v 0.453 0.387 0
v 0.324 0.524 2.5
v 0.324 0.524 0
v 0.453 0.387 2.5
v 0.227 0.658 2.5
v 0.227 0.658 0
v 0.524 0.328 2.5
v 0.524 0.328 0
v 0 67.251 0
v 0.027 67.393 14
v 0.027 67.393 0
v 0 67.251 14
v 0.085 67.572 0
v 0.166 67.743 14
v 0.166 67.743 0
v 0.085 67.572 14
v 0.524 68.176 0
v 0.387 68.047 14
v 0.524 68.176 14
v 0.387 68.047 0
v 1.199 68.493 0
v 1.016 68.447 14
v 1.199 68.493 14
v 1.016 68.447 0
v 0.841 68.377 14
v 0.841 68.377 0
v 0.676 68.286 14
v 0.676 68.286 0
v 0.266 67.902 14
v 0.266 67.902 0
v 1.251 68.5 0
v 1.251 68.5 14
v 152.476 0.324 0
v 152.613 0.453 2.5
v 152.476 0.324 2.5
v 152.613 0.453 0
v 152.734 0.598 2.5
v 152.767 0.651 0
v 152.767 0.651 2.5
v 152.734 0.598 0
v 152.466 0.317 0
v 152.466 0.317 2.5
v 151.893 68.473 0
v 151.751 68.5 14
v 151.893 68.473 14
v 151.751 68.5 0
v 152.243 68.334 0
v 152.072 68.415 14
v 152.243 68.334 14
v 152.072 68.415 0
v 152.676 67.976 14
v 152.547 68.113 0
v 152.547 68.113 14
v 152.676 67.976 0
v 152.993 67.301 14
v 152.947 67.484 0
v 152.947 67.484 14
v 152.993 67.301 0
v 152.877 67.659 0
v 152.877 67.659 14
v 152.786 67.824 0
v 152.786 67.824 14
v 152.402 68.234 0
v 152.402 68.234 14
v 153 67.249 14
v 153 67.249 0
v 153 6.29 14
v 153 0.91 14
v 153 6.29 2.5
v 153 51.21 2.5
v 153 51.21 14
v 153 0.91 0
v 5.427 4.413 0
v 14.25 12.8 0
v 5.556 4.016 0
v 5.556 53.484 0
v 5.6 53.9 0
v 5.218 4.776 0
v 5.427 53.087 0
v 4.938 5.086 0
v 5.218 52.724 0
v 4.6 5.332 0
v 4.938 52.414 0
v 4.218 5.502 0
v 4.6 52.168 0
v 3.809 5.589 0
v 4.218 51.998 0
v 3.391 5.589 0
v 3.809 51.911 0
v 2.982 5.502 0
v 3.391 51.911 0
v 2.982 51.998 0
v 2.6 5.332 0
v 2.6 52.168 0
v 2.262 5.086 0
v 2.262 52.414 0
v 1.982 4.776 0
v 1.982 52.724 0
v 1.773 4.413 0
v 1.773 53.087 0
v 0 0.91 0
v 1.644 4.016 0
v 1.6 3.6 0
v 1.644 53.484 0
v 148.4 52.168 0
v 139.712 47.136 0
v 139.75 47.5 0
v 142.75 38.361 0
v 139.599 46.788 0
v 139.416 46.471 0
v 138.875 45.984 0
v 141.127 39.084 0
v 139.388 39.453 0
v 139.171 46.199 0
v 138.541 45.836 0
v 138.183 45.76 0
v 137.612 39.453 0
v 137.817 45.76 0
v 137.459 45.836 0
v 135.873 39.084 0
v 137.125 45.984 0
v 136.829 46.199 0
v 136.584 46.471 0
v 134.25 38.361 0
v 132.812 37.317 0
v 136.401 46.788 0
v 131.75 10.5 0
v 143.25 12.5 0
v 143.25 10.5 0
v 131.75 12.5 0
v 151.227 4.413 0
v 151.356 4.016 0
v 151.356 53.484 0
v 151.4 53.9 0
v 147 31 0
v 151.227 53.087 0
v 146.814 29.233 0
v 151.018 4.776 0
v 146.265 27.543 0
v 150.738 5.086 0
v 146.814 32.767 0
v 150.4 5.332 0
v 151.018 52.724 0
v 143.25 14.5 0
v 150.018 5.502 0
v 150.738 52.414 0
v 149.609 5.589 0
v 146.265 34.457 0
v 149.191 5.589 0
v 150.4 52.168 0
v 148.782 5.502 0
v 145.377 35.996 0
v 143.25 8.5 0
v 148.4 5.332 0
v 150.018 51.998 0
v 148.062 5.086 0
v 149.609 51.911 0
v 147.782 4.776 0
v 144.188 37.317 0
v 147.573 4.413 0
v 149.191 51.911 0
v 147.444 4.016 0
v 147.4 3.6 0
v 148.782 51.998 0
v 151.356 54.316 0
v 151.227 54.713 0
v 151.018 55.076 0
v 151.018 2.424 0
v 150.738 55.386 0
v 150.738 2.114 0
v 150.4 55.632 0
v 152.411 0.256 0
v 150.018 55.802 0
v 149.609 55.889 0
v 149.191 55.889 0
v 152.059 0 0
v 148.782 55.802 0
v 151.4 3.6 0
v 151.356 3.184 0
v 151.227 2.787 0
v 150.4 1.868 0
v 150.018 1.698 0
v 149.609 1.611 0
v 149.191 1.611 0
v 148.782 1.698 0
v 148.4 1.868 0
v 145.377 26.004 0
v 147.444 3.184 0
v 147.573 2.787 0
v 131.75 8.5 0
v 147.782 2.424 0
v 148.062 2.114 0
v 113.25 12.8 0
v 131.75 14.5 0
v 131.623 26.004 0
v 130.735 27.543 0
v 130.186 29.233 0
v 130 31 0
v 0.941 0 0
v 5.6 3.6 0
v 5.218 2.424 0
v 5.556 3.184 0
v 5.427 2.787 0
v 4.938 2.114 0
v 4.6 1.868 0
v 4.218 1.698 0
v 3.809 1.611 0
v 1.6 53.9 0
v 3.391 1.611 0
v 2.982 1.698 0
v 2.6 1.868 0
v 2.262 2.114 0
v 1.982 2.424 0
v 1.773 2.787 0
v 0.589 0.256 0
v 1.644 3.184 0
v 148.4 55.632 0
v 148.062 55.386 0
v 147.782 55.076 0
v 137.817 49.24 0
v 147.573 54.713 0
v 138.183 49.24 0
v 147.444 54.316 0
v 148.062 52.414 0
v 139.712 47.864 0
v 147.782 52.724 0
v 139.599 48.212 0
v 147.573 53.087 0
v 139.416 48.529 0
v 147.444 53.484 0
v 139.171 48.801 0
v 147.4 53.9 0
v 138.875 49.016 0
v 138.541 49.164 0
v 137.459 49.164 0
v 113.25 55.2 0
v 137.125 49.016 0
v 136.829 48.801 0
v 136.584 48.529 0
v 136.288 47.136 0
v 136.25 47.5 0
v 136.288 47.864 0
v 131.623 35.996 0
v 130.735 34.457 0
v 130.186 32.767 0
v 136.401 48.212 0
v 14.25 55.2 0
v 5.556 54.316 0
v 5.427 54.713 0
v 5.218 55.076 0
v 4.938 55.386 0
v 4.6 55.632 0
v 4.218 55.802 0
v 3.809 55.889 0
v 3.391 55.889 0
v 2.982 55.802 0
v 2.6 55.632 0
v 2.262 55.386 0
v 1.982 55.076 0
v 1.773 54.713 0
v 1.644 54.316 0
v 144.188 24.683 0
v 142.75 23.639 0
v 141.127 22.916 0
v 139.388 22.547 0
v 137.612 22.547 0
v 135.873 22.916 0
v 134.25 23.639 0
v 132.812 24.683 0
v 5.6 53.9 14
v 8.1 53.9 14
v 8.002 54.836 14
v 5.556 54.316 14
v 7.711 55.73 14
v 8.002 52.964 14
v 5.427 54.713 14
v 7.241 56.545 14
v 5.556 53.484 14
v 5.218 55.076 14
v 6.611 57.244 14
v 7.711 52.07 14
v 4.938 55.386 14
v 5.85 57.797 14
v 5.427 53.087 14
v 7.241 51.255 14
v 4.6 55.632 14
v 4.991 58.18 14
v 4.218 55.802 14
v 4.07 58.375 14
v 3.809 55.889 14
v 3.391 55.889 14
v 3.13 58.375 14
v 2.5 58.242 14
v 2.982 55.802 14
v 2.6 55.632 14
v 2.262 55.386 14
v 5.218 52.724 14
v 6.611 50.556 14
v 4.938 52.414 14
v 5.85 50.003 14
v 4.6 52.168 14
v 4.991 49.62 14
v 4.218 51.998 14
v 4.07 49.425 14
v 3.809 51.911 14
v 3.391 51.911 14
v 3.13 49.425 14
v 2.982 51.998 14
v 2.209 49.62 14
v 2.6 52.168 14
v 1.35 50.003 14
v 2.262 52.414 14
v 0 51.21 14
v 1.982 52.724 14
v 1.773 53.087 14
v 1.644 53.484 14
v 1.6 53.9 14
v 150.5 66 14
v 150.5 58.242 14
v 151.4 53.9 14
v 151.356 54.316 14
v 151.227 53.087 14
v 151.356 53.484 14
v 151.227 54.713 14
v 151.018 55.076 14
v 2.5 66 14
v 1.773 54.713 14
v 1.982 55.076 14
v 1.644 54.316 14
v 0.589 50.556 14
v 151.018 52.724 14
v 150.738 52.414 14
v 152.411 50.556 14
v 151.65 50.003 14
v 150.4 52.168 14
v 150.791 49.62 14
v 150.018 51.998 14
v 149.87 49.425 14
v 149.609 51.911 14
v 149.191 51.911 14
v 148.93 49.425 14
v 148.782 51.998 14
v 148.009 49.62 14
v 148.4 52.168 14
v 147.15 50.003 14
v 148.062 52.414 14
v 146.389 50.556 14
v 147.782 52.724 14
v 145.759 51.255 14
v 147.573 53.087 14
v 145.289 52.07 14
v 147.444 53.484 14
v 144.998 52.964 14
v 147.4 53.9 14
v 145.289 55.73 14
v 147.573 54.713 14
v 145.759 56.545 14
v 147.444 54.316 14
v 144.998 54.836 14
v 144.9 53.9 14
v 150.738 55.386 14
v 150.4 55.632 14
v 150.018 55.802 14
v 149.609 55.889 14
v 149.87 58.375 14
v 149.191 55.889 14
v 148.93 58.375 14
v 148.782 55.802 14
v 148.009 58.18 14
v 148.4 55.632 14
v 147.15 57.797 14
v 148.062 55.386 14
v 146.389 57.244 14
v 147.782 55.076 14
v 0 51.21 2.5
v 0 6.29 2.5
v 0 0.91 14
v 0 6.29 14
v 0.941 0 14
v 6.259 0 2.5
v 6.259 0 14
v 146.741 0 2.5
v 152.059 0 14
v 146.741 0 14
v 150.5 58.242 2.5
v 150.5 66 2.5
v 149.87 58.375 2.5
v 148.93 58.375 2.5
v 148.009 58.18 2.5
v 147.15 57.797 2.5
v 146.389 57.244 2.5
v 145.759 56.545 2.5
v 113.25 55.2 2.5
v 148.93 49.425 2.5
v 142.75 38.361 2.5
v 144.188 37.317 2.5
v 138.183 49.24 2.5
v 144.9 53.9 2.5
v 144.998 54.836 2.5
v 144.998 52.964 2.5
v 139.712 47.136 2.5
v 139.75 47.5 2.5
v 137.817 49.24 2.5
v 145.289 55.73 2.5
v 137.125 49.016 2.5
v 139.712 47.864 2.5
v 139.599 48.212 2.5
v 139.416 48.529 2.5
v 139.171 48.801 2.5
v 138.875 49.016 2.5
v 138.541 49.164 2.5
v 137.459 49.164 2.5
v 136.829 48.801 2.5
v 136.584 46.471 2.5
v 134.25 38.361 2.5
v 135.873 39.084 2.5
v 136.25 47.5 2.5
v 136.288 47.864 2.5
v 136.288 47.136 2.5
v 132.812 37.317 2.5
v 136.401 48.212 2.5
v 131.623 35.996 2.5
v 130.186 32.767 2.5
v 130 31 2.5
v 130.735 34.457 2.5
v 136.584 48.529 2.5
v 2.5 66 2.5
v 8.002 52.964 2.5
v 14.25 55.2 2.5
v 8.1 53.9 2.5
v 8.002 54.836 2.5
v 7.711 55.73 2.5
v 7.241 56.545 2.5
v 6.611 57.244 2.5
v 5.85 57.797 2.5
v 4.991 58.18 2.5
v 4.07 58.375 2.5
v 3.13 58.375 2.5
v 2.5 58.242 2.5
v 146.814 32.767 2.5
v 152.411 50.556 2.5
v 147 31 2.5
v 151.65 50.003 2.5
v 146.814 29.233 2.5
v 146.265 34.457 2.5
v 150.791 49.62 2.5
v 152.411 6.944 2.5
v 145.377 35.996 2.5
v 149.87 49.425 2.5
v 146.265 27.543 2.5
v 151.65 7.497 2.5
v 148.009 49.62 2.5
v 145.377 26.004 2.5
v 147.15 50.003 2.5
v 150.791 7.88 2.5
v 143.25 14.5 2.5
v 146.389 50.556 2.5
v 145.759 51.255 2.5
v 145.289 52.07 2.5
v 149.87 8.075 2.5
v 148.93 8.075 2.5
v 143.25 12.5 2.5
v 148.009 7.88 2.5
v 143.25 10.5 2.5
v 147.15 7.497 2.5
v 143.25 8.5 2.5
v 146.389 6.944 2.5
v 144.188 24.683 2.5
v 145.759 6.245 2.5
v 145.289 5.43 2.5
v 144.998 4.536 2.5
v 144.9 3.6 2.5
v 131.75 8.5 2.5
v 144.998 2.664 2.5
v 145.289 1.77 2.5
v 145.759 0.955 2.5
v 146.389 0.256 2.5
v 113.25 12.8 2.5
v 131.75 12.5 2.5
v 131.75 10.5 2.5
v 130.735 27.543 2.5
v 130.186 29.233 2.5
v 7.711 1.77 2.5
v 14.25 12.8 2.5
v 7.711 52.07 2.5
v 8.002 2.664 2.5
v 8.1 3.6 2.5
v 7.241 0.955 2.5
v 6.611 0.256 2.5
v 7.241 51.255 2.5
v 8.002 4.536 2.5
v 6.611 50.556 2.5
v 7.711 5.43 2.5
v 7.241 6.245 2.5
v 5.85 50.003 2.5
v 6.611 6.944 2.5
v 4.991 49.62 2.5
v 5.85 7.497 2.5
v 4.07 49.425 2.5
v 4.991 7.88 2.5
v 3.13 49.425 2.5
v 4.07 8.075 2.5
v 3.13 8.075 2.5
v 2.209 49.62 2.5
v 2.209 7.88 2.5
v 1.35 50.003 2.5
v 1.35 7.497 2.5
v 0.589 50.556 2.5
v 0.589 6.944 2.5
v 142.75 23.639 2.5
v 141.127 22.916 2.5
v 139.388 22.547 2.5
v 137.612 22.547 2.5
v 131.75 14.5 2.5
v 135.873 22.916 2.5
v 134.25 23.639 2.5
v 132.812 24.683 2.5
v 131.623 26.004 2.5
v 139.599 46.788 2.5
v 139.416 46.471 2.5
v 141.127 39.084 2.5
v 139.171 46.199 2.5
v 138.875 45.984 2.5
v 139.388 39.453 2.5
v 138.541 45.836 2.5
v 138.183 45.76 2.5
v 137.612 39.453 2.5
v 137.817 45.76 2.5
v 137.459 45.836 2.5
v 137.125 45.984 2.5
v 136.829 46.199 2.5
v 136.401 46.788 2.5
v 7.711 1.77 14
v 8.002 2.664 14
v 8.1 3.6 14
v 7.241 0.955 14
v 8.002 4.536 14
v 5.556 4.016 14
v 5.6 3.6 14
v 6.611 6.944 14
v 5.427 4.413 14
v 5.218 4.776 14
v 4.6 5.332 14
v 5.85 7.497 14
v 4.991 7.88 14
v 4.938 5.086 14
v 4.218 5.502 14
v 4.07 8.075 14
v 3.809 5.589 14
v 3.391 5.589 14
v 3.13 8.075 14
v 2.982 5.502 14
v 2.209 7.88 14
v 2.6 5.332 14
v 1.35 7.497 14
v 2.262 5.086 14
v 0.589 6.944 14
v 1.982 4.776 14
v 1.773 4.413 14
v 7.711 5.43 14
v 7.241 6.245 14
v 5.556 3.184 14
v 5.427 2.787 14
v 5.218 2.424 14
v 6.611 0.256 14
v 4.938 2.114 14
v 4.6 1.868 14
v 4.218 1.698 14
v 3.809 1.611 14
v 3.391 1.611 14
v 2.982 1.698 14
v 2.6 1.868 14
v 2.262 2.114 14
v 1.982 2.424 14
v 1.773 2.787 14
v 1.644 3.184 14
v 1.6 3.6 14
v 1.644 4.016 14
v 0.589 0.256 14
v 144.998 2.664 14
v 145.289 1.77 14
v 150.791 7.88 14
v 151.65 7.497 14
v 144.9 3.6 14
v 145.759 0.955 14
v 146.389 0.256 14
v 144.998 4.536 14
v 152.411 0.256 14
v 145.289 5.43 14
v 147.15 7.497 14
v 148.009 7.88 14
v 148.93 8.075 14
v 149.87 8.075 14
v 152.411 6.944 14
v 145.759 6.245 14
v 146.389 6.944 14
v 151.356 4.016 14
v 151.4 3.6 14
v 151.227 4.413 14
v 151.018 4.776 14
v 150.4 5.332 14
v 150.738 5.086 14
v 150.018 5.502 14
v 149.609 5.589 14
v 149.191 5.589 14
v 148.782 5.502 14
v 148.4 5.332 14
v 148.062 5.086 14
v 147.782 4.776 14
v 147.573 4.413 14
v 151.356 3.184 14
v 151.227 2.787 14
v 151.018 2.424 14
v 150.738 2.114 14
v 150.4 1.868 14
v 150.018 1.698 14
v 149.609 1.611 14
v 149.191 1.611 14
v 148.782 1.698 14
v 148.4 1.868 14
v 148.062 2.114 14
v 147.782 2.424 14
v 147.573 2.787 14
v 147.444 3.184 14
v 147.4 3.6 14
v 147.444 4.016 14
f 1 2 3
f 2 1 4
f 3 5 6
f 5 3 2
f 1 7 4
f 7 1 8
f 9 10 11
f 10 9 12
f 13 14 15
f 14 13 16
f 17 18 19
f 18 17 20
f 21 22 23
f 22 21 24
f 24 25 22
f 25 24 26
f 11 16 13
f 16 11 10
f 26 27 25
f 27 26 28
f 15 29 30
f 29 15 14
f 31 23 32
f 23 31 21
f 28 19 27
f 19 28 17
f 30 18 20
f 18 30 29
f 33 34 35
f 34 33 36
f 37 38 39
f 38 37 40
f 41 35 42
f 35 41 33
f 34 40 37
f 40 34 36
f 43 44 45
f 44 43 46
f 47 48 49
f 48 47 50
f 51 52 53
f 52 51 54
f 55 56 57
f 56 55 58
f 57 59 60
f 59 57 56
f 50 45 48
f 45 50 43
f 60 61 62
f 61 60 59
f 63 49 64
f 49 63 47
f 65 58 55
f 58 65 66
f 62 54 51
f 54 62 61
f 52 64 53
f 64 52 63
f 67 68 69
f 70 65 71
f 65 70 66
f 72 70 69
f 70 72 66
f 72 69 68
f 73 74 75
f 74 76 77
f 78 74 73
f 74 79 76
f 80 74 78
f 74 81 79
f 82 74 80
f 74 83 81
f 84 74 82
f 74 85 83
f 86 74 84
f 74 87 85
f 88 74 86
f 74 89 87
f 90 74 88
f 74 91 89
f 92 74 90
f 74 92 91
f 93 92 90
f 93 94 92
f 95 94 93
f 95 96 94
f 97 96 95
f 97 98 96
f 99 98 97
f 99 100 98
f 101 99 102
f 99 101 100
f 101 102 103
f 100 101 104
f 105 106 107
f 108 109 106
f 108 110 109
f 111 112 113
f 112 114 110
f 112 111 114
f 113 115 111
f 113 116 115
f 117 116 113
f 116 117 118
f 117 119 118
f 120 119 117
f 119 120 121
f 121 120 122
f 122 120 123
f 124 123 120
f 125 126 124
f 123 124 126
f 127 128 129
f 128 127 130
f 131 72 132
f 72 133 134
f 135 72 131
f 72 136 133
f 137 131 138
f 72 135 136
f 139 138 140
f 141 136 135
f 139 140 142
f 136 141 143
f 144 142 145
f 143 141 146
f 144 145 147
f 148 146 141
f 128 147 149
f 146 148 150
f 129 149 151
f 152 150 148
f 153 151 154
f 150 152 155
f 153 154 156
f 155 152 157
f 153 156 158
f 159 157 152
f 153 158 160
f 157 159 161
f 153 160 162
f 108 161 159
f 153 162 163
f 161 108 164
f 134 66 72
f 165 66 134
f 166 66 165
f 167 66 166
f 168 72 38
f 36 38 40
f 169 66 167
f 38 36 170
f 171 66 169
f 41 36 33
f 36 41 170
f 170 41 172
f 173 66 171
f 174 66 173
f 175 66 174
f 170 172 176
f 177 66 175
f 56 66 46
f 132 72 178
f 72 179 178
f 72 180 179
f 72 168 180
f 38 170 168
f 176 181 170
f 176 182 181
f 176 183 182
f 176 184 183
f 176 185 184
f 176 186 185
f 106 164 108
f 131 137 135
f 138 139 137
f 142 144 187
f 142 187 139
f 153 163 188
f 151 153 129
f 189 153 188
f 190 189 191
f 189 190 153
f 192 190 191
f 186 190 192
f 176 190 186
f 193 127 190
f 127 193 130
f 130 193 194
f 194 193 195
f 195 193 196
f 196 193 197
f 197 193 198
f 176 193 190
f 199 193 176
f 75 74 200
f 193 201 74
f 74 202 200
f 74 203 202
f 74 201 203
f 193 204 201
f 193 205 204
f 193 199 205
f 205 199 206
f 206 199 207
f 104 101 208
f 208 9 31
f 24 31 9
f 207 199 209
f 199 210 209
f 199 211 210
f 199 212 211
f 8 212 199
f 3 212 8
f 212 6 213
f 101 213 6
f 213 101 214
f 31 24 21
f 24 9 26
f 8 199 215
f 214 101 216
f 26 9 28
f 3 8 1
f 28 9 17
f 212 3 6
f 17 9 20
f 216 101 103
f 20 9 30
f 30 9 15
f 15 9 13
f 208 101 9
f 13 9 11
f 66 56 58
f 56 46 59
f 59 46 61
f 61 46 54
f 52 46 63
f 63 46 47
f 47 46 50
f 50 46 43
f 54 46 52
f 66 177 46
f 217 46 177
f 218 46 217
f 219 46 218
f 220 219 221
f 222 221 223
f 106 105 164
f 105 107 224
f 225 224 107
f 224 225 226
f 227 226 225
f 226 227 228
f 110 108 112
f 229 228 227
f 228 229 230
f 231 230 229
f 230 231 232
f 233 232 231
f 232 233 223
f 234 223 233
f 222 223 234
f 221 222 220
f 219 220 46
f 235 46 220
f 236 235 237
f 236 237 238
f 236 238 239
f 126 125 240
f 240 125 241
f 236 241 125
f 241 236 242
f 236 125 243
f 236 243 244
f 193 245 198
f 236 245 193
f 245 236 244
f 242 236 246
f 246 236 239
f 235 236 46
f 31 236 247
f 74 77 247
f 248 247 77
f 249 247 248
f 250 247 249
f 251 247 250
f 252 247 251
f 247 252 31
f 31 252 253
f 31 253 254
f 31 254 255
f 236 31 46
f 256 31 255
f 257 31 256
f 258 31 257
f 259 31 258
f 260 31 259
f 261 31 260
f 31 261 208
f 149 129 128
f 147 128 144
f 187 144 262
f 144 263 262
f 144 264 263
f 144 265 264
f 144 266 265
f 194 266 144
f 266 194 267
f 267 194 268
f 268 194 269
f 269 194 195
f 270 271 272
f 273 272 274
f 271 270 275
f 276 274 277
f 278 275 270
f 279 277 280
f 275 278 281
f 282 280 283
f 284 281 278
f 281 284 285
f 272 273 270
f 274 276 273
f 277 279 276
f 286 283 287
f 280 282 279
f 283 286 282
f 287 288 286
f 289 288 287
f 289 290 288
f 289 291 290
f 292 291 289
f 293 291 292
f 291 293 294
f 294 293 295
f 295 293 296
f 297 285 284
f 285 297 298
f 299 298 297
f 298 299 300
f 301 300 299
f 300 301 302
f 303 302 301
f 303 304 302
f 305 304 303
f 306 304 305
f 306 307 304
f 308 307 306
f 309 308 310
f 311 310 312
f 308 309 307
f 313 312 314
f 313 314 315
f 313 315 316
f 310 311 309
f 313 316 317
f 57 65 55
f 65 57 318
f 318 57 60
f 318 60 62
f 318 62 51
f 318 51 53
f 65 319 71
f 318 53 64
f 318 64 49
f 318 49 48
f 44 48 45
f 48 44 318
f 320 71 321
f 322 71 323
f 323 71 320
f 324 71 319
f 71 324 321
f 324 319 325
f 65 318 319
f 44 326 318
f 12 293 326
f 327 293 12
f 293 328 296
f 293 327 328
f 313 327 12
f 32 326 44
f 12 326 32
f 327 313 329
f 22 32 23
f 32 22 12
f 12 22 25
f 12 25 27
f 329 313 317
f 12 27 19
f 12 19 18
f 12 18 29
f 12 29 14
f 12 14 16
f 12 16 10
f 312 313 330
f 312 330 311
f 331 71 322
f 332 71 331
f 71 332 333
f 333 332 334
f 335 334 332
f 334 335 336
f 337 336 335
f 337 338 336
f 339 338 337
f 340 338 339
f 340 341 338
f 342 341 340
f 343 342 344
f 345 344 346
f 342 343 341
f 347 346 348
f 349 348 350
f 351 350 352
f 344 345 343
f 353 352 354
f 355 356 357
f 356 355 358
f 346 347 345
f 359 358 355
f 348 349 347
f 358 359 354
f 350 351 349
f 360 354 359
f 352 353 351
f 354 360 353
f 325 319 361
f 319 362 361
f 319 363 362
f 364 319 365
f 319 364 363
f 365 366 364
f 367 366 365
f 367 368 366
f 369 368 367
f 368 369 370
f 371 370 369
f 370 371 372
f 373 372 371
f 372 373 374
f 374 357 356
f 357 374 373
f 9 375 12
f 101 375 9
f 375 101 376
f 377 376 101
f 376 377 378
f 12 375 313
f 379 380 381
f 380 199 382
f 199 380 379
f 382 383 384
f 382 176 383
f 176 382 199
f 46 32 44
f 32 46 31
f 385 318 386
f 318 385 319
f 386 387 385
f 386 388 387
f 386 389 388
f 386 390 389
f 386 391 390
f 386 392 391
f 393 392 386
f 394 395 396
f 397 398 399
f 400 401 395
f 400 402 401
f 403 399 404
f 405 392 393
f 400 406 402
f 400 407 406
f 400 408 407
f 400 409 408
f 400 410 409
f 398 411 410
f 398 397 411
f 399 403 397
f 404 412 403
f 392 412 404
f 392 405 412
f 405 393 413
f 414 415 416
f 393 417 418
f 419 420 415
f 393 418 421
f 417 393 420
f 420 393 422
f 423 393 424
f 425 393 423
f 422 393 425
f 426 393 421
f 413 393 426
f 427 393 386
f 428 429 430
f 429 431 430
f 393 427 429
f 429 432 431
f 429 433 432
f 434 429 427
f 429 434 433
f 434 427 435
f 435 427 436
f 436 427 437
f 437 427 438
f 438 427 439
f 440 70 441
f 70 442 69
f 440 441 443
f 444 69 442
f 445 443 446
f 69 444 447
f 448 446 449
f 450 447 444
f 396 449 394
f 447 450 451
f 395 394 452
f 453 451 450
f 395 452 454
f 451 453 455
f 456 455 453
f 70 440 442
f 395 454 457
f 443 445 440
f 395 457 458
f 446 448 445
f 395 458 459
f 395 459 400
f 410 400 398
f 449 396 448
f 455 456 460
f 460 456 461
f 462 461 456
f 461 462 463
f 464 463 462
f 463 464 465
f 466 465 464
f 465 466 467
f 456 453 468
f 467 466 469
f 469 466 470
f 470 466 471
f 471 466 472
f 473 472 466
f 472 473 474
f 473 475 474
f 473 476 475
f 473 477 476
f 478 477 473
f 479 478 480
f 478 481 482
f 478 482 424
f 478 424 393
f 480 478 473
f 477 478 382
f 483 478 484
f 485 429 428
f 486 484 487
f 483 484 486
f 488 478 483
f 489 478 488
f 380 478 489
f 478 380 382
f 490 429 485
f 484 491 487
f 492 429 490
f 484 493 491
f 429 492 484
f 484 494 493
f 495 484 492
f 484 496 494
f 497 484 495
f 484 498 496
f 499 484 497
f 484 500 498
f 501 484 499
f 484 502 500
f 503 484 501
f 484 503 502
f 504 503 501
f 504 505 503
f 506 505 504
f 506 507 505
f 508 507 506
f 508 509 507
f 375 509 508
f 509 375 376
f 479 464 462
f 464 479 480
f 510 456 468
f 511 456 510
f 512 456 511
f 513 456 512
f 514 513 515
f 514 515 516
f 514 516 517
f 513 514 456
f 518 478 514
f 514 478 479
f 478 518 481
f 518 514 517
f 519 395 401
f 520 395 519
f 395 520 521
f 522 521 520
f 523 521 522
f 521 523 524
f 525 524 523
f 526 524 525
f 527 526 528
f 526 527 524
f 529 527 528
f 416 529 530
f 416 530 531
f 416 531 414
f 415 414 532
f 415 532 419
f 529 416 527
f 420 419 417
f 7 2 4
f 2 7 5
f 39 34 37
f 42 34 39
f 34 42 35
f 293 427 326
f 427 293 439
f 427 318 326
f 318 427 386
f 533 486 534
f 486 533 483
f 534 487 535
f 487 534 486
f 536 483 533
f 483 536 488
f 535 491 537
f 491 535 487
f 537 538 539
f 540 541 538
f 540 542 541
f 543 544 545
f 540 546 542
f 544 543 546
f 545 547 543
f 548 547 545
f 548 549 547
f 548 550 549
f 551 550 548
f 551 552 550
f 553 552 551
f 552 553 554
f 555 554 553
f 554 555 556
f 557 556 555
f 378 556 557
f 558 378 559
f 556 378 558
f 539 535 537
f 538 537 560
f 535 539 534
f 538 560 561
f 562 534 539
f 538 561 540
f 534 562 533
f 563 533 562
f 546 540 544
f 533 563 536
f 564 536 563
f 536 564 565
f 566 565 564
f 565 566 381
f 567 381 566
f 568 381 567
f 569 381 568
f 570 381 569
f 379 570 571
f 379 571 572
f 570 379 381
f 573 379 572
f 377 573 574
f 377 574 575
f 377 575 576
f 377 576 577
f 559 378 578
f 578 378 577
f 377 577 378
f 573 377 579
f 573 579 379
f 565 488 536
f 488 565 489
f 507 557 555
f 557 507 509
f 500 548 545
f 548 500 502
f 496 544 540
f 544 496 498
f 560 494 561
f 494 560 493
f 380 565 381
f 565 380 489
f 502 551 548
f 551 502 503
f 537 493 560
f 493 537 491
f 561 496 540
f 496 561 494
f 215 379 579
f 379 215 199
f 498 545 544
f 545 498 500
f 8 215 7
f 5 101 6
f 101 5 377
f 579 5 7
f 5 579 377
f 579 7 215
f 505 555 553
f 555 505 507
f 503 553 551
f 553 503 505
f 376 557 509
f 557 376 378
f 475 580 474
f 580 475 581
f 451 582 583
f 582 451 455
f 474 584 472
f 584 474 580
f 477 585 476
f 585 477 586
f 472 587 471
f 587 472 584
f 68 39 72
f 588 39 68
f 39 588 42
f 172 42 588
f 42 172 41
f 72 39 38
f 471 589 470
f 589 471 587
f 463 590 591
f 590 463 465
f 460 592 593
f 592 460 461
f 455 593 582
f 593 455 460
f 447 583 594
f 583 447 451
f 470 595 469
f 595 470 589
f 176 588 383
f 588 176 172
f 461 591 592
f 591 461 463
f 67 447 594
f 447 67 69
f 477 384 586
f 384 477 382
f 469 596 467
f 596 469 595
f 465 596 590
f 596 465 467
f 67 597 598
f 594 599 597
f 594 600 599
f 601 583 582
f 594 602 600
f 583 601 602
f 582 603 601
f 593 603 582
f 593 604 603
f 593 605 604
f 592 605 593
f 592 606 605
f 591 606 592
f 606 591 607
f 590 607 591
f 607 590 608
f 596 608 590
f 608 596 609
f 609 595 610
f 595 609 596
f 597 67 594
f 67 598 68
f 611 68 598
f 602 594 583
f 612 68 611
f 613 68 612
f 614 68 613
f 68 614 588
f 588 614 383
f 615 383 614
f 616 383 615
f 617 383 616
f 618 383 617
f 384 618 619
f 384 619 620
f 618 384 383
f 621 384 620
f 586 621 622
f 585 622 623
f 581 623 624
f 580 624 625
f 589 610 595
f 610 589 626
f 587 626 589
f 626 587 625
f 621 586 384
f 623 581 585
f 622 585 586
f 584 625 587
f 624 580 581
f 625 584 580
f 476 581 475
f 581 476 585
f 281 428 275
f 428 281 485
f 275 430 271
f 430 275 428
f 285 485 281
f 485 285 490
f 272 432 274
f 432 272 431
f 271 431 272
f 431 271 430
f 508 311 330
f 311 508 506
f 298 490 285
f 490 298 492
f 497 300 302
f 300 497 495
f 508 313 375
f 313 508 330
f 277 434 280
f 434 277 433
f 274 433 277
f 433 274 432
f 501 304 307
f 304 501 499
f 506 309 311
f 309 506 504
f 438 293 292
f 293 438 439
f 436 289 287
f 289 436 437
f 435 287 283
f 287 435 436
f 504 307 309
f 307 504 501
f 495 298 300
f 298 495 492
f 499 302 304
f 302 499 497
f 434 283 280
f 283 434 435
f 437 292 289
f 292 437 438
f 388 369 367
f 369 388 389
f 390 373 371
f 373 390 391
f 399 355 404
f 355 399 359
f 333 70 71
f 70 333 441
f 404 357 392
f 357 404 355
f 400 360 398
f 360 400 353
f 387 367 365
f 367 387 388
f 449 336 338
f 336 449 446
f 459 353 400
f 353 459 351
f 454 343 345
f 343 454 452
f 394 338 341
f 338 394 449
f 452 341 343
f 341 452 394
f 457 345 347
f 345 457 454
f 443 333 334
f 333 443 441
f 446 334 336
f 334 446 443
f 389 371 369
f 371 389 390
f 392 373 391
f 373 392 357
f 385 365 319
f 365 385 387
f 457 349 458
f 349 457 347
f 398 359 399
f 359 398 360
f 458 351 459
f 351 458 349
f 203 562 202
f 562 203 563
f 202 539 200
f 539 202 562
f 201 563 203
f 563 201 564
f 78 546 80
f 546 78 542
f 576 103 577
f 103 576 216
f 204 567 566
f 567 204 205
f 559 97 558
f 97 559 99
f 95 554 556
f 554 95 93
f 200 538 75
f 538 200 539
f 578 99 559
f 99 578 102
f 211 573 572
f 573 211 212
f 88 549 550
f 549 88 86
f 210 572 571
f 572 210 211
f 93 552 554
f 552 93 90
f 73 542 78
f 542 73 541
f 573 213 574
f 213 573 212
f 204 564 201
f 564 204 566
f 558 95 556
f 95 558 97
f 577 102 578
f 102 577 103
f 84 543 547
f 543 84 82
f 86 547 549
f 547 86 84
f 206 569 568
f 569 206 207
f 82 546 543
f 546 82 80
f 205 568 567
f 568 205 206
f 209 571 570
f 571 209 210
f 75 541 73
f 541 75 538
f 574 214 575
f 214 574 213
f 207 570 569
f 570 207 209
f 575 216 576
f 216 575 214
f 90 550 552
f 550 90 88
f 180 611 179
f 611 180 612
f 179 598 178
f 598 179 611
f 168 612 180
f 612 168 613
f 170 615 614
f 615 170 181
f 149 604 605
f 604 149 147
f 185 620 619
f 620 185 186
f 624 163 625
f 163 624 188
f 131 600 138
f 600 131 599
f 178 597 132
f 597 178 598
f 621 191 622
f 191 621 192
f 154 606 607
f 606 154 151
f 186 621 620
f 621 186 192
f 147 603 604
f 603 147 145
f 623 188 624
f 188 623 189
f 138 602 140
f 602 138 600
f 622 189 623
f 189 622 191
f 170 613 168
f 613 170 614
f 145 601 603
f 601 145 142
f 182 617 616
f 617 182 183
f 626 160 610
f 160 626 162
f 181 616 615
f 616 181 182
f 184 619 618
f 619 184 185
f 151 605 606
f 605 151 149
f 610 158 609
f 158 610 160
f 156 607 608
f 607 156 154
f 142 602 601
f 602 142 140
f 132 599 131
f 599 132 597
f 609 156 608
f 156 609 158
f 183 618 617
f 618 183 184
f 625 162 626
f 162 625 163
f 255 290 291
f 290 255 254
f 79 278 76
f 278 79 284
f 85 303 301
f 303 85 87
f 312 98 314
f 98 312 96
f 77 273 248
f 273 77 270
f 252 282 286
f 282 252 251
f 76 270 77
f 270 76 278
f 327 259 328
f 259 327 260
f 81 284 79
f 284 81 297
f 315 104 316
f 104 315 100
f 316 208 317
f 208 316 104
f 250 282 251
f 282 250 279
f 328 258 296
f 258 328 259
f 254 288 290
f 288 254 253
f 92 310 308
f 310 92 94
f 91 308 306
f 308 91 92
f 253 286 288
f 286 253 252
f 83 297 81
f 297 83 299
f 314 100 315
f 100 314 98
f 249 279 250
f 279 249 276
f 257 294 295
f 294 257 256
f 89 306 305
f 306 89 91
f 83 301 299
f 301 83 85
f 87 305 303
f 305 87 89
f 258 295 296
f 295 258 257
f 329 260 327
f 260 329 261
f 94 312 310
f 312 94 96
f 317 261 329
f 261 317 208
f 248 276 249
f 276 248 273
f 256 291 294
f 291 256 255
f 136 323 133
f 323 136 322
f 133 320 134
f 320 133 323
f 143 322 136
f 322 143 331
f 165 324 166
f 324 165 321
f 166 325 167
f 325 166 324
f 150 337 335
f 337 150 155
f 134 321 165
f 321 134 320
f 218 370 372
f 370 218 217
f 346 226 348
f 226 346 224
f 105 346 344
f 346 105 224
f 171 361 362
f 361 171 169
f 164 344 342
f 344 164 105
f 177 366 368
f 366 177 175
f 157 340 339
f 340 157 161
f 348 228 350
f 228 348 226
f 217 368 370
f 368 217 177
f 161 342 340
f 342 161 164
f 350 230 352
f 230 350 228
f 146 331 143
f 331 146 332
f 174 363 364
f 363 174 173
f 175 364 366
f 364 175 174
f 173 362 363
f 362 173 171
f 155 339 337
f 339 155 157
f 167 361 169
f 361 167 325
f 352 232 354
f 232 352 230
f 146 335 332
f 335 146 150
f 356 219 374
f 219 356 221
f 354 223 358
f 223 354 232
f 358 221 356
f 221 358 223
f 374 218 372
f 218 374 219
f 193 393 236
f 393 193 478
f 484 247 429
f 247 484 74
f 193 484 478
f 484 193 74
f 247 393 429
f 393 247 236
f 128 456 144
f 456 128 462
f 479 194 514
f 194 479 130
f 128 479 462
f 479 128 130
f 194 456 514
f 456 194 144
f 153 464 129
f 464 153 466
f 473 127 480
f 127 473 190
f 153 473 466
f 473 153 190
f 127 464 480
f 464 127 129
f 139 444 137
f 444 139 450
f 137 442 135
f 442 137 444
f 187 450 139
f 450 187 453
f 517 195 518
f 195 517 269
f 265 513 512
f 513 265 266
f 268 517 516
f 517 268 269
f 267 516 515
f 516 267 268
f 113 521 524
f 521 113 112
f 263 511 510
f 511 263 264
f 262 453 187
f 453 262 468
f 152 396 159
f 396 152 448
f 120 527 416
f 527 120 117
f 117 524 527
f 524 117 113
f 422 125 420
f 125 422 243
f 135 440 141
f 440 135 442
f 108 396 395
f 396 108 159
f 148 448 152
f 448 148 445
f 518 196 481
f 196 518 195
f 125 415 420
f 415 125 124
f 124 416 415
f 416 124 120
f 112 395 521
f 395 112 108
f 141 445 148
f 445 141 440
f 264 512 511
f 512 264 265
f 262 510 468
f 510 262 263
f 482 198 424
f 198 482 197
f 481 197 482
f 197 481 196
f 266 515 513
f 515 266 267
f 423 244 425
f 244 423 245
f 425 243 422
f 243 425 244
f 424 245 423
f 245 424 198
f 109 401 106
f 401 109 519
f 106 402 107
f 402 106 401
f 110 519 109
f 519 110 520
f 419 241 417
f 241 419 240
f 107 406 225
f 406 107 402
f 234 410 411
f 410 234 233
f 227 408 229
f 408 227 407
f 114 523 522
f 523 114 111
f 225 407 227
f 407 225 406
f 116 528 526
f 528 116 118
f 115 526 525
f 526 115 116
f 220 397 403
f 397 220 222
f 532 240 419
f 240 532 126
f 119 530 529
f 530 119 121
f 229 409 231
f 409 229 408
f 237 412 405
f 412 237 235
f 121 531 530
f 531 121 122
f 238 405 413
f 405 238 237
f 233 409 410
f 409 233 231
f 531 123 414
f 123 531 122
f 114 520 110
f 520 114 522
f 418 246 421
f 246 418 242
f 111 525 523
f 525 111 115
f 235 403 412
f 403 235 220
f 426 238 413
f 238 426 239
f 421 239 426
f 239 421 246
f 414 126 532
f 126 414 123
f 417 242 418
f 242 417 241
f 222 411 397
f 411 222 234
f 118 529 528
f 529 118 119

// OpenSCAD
// file: library/library_3d.scad
// ========================================================================================
// Robori Mendel
// General 3D library
// GNU GPL v3
//
// Contact : support@robori.com
// Reference : http://www.robori.com/documentation/Mendel
//
// History :
// 2013 - First version
// ========================================================================================

lib3d_fn = 50;

// TESTING
//lib3d_hex_nut_recess(3);
//lib3d_round_cube(10, 8, 10, 1, true, false, true, false);


// Hexagonal nut recess
module lib3d_hex_nut_recess(size)
{
	length = 0.8*size;
	hex_r = 1.8*size/2;
	cylinder(h=length, r=hex_r, center=false, $fn=6);
}

// Cube with customized rounded corners
module lib3d_round_cube(x, y, z, rad, left_top=true, left_bottom=true, right_top=true, right_bottom=true)
{
	rx = x/2 - rad + 0.02;
	ry = y/2 - rad + 0.02;

	translate([x/2, y/2, 0]) difference()
	{	
		translate([-x/2, -y/2, 0]) cube([x, y, z]);
		if (left_top)
			translate([-rx, ry, -1]) rotate([0, 0, 90]) __lib3d_round_corner(rad, z + 2);
		if (left_bottom)
			translate([-rx, -ry, -1]) rotate([0, 0, 180]) __lib3d_round_corner(rad, z + 2);
		if (right_top)
			translate([rx, ry, -1]) __lib3d_round_corner(rad, z + 2);
		if (right_bottom)
			translate([rx, -ry, -1]) rotate([0, 0, 270]) __lib3d_round_corner(rad, z + 2);
	}
}

// Helper
module __lib3d_round_corner(rad, height)
{
	difference()
	{
		cube([rad, rad, height]);
		cylinder(h=height, r=rad, center=false, $fn=lib3d_fn);
	}
}
// main file
// ========================================================================================
// Robori Mendel
// LCD cover for RepRapDiscount 2004 smart controller
// GNU GPL v3
//
// Contact : support@robori.com
// Reference : http://www.robori.com/documentation/Mendel
//
// History :
// 22 May 2015 - First version
// ========================================================================================

include <library/library_3d.scad>

$fn = 30;

cover_l = 151 + 2;
cover_w = 64 + 2 + 2.5;	
cover_h = 14;
cover_r = 1.5;
cover_wall_t = 2.5;
cover_front_t = 2.5;
cover_pillar_t = 2.5;
cover_screw_d = 3 + 1;

cover_screen_l = 97 + 2*1;
cover_screen_w = 40 + 2*1.2;

cover_buzz_l = 11.5;
cover_buzz_w = 2;

cover_encoder_d = 15 + 2;
cover_reset_d = 3.5;


lcd_cover();

module lcd_cover()
{
	// screw
	screw_dist = 2.6 + 1;
	lcd_pcb_excess = 8.5 + 1 + 2.5;
	screw1 = [screw_dist, cover_w - screw_dist, 0];
	screw2 = [cover_l - screw_dist, cover_w - screw_dist, 0];
	screw3 = [screw_dist, lcd_pcb_excess + screw_dist - 1, 0];
	screw4 = [cover_l - screw_dist, lcd_pcb_excess + screw_dist - 1, 0];

	// screen
	screen_center_x = 14.25 + 1 + 97/2;
	screen_center_y = 11 + 1 + 2.5 + 40/2;

	// buzz
	buzz_center_x = 136.5 + 1;
	buzz_center_y = 45 + lcd_pcb_excess;
	buzz_space_y = 2;

	// encoder
	encoder_x = 137.5 + 1;
	encoder_y = 25.5 + lcd_pcb_excess;

	// reset
	reset_x = 137 + 1;
	reset_y = 9 + lcd_pcb_excess;

	translate([0, cover_w, cover_h]) rotate([180, 0, 0]) difference()
	{
		union()
		{
			difference()
			{
				// block
				lib3d_round_cube(cover_l, cover_w, cover_h, cover_r, left_top=true, left_bottom=true, right_top=true, right_bottom=true);
				// wall : 4 sides
				//translate([cover_wall_t, cover_wall_t, -cover_front_t]) cube([cover_l - 2*cover_wall_t, cover_w - 2*cover_wall_t, cover_h]);
				// wall : bottom only
				translate([cover_wall_t, cover_wall_t, -cover_front_t]) cube([cover_l - 2*cover_wall_t, cover_w, cover_h]);
				translate([-1, lcd_pcb_excess + screw_dist - 1, -cover_front_t]) cube([cover_l + 2, cover_w, cover_h]);
			}
			// pillars
			translate(screw1) cylinder(r=cover_screw_d/2 + cover_pillar_t, h=cover_h, center=false);
			translate(screw2) cylinder(r=cover_screw_d/2 + cover_pillar_t, h=cover_h, center=false);
			translate(screw3) cylinder(r=cover_screw_d/2 + cover_pillar_t, h=cover_h, center=false);
			translate(screw4) cylinder(r=cover_screw_d/2 + cover_pillar_t, h=cover_h, center=false);
		}
		// screw holes
		translate([screw1[0], screw1[1], -1]) cylinder(r=cover_screw_d/2, h=cover_h + 2, center=false);
		translate([screw2[0], screw2[1], -1]) cylinder(r=cover_screw_d/2, h=cover_h + 2, center=false);
		translate([screw3[0], screw3[1], -1]) cylinder(r=cover_screw_d/2, h=cover_h + 2, center=false);
		translate([screw4[0], screw4[1], -1]) cylinder(r=cover_screw_d/2, h=cover_h + 2, center=false);
		// cut screw hole block excesses
		translate([-5, cover_w, -1]) cube([cover_l + 2*5, 10, cover_h + 2]);	// top
		translate([-10, -5, -1]) cube([10, cover_w + 2*5, cover_h + 2]);		// left
		translate([cover_l, -5, -1]) cube([10, cover_w + 2*5, cover_h + 2]);	// right
		// screen
		translate([screen_center_x - cover_screen_l/2, screen_center_y - cover_screen_w/2, -1]) cube([cover_screen_l, cover_screen_w, cover_h + 2]);
		// buzz
		translate([buzz_center_x - cover_buzz_l/2, buzz_center_y - buzz_space_y/2 - cover_buzz_w, -1]) cube([cover_buzz_l, cover_buzz_w, cover_h + 2]);
		translate([buzz_center_x - cover_buzz_l/2, buzz_center_y + buzz_space_y/2, -1]) cube([cover_buzz_l, cover_buzz_w, cover_h + 2]);
		// encoder
		translate([encoder_x, encoder_y, -1]) cylinder(r=cover_encoder_d/2, h=cover_h + 2, center=false);
		// reset
		translate([reset_x, reset_y, -1]) cylinder(r=cover_reset_d/2, h=cover_h + 2, center=false);
	}
}
